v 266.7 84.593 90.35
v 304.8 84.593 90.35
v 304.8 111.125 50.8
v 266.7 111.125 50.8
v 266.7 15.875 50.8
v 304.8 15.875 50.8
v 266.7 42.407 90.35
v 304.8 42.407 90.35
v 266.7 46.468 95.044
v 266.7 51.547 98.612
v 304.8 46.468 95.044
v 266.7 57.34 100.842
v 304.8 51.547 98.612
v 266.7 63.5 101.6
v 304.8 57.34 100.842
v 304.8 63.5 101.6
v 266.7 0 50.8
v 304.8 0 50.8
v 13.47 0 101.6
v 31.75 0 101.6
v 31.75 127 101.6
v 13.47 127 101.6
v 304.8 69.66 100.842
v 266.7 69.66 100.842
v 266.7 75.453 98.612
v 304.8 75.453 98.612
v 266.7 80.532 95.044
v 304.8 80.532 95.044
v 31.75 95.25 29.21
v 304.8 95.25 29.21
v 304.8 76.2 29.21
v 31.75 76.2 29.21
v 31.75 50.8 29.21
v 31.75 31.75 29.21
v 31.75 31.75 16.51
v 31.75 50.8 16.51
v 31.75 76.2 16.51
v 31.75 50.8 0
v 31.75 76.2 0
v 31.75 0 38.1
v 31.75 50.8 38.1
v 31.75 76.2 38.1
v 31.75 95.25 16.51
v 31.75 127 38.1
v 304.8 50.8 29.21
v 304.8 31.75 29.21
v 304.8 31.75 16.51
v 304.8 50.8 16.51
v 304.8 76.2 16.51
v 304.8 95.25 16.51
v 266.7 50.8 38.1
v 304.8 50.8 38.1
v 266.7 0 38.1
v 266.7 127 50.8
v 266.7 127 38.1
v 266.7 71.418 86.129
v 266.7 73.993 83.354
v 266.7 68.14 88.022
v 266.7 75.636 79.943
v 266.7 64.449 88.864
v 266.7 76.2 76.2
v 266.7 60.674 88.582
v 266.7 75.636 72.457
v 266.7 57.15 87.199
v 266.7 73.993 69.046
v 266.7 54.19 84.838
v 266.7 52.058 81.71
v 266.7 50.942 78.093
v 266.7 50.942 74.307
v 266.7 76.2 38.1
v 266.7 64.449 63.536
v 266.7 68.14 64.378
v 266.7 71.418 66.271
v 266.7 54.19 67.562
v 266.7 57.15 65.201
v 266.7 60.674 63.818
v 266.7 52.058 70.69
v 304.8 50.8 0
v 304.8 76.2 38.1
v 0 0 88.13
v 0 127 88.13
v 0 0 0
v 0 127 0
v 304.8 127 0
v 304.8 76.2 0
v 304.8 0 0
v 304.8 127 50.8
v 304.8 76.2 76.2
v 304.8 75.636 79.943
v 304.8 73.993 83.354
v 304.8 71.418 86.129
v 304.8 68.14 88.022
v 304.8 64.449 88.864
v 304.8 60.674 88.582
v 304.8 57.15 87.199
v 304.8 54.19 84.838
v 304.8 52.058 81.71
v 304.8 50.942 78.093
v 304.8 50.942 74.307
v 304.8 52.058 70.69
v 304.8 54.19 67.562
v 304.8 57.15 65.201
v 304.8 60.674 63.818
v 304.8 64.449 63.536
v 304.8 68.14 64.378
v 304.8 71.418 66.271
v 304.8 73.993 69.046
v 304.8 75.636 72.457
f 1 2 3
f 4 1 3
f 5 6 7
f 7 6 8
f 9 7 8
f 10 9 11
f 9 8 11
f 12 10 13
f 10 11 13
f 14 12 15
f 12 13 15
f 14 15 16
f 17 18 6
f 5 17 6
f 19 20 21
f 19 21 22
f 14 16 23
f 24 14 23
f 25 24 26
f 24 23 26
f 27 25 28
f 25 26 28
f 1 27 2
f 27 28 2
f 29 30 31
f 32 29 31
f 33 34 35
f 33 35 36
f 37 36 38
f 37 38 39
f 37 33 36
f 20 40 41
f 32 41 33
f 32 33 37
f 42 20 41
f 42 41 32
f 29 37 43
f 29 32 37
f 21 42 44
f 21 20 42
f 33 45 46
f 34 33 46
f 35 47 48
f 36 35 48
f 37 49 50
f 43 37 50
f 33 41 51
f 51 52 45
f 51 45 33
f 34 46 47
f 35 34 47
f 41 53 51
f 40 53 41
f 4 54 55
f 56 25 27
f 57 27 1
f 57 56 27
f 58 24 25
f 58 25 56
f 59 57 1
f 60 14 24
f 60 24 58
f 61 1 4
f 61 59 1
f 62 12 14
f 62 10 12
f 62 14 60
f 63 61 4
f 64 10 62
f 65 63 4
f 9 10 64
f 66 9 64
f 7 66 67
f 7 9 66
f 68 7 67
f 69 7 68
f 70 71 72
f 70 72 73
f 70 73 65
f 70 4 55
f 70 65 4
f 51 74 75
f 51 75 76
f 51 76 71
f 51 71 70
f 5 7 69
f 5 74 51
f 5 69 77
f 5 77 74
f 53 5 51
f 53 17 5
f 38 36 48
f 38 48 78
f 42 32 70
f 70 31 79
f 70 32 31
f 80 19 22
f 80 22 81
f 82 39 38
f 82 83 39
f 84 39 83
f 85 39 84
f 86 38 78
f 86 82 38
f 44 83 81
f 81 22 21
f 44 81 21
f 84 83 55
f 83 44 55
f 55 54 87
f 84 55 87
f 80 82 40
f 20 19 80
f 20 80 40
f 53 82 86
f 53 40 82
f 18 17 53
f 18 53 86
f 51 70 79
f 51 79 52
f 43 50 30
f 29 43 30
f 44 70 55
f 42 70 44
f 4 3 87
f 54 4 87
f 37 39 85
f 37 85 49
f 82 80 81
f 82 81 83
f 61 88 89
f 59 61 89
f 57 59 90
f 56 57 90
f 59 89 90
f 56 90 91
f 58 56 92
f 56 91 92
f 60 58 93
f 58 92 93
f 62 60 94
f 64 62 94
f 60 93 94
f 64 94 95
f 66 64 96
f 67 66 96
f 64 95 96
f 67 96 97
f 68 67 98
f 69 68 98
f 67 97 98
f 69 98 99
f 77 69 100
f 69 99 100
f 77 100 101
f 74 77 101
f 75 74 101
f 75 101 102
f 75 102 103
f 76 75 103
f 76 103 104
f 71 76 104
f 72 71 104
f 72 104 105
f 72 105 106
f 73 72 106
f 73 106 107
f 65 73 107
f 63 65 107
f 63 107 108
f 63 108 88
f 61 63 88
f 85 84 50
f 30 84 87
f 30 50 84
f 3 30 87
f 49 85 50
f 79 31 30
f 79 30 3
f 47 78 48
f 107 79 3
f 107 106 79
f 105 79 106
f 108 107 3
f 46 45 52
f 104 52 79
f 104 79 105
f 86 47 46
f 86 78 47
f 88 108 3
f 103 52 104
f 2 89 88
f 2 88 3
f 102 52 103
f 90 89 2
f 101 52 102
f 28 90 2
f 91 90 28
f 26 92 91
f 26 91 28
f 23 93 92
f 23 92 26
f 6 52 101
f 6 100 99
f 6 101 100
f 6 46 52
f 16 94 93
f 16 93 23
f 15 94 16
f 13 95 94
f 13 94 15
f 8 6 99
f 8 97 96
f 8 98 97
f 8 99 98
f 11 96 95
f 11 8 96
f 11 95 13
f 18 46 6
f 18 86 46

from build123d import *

# Parameters (mm, degrees)
F1_DEPTH = 127
F3_DEPTH = 273.05
F4_R     = 12.7
F5_DEPTH = 50.8
F6_DEPTH = 50.8


with BuildPart() as f1:
    # F0 (on Front) → F1 (new body)
    with BuildSketch(Plane.XZ):
        Polygon((0, 88.129619), (0, 0), (304.8, 0), (304.8, 101.600003), (266.7, 101.600003), (266.7, 38.1), (31.75, 38.1), (31.75, 101.600003), (13.470384, 101.600003), align=None)
    extrude(amount=-F1_DEPTH)

    # F2 (on face) → F3 (cut)
    with BuildSketch(Plane.YZ.offset(304.8)):
        Polygon((50.8, 16.51), (50.8, 0), (76.2, 0), (76.2, 16.51), (95.25, 16.51), (95.25, 29.21), (76.2, 29.21), (76.2, 38.1), (50.8, 38.1), (50.8, 29.21), (31.75, 29.21), (31.75, 16.51), align=None)
    extrude(amount=-F3_DEPTH, mode=Mode.SUBTRACT)

    # F4 (on face) → F5 (cut)
    with BuildSketch(Plane.YZ.offset(304.8)):
        with Locations((63.5, 76.200003)):
            Circle(F4_R)
    extrude(amount=-F5_DEPTH, mode=Mode.SUBTRACT)

    # F4 (on face) → F6 (cut)
    with BuildSketch(Plane.YZ.offset(304.8)):
        with BuildLine():
            Line((0, 101.600003), (0, 50.8))
            Line((0, 50.8), (15.875, 50.8))
            Line((15.875, 50.8), (42.406574, 90.350175))
            ThreePointArc((42.406574, 90.350175), (51.547058, 98.611767), (63.5, 101.600003))
            Line((63.5, 101.600003), (0, 101.600003))
        make_face()
        with BuildLine():
            Line((127, 101.600003), (63.5, 101.600003))
            ThreePointArc((63.5, 101.600003), (75.452942, 98.611767), (84.593426, 90.350175))
            Line((84.593426, 90.350175), (111.125, 50.8))
            Line((111.125, 50.8), (127, 50.8))
            Line((127, 50.8), (127, 101.600003))
        make_face()
    extrude(amount=-F6_DEPTH, mode=Mode.SUBTRACT)


solid = f1.part
